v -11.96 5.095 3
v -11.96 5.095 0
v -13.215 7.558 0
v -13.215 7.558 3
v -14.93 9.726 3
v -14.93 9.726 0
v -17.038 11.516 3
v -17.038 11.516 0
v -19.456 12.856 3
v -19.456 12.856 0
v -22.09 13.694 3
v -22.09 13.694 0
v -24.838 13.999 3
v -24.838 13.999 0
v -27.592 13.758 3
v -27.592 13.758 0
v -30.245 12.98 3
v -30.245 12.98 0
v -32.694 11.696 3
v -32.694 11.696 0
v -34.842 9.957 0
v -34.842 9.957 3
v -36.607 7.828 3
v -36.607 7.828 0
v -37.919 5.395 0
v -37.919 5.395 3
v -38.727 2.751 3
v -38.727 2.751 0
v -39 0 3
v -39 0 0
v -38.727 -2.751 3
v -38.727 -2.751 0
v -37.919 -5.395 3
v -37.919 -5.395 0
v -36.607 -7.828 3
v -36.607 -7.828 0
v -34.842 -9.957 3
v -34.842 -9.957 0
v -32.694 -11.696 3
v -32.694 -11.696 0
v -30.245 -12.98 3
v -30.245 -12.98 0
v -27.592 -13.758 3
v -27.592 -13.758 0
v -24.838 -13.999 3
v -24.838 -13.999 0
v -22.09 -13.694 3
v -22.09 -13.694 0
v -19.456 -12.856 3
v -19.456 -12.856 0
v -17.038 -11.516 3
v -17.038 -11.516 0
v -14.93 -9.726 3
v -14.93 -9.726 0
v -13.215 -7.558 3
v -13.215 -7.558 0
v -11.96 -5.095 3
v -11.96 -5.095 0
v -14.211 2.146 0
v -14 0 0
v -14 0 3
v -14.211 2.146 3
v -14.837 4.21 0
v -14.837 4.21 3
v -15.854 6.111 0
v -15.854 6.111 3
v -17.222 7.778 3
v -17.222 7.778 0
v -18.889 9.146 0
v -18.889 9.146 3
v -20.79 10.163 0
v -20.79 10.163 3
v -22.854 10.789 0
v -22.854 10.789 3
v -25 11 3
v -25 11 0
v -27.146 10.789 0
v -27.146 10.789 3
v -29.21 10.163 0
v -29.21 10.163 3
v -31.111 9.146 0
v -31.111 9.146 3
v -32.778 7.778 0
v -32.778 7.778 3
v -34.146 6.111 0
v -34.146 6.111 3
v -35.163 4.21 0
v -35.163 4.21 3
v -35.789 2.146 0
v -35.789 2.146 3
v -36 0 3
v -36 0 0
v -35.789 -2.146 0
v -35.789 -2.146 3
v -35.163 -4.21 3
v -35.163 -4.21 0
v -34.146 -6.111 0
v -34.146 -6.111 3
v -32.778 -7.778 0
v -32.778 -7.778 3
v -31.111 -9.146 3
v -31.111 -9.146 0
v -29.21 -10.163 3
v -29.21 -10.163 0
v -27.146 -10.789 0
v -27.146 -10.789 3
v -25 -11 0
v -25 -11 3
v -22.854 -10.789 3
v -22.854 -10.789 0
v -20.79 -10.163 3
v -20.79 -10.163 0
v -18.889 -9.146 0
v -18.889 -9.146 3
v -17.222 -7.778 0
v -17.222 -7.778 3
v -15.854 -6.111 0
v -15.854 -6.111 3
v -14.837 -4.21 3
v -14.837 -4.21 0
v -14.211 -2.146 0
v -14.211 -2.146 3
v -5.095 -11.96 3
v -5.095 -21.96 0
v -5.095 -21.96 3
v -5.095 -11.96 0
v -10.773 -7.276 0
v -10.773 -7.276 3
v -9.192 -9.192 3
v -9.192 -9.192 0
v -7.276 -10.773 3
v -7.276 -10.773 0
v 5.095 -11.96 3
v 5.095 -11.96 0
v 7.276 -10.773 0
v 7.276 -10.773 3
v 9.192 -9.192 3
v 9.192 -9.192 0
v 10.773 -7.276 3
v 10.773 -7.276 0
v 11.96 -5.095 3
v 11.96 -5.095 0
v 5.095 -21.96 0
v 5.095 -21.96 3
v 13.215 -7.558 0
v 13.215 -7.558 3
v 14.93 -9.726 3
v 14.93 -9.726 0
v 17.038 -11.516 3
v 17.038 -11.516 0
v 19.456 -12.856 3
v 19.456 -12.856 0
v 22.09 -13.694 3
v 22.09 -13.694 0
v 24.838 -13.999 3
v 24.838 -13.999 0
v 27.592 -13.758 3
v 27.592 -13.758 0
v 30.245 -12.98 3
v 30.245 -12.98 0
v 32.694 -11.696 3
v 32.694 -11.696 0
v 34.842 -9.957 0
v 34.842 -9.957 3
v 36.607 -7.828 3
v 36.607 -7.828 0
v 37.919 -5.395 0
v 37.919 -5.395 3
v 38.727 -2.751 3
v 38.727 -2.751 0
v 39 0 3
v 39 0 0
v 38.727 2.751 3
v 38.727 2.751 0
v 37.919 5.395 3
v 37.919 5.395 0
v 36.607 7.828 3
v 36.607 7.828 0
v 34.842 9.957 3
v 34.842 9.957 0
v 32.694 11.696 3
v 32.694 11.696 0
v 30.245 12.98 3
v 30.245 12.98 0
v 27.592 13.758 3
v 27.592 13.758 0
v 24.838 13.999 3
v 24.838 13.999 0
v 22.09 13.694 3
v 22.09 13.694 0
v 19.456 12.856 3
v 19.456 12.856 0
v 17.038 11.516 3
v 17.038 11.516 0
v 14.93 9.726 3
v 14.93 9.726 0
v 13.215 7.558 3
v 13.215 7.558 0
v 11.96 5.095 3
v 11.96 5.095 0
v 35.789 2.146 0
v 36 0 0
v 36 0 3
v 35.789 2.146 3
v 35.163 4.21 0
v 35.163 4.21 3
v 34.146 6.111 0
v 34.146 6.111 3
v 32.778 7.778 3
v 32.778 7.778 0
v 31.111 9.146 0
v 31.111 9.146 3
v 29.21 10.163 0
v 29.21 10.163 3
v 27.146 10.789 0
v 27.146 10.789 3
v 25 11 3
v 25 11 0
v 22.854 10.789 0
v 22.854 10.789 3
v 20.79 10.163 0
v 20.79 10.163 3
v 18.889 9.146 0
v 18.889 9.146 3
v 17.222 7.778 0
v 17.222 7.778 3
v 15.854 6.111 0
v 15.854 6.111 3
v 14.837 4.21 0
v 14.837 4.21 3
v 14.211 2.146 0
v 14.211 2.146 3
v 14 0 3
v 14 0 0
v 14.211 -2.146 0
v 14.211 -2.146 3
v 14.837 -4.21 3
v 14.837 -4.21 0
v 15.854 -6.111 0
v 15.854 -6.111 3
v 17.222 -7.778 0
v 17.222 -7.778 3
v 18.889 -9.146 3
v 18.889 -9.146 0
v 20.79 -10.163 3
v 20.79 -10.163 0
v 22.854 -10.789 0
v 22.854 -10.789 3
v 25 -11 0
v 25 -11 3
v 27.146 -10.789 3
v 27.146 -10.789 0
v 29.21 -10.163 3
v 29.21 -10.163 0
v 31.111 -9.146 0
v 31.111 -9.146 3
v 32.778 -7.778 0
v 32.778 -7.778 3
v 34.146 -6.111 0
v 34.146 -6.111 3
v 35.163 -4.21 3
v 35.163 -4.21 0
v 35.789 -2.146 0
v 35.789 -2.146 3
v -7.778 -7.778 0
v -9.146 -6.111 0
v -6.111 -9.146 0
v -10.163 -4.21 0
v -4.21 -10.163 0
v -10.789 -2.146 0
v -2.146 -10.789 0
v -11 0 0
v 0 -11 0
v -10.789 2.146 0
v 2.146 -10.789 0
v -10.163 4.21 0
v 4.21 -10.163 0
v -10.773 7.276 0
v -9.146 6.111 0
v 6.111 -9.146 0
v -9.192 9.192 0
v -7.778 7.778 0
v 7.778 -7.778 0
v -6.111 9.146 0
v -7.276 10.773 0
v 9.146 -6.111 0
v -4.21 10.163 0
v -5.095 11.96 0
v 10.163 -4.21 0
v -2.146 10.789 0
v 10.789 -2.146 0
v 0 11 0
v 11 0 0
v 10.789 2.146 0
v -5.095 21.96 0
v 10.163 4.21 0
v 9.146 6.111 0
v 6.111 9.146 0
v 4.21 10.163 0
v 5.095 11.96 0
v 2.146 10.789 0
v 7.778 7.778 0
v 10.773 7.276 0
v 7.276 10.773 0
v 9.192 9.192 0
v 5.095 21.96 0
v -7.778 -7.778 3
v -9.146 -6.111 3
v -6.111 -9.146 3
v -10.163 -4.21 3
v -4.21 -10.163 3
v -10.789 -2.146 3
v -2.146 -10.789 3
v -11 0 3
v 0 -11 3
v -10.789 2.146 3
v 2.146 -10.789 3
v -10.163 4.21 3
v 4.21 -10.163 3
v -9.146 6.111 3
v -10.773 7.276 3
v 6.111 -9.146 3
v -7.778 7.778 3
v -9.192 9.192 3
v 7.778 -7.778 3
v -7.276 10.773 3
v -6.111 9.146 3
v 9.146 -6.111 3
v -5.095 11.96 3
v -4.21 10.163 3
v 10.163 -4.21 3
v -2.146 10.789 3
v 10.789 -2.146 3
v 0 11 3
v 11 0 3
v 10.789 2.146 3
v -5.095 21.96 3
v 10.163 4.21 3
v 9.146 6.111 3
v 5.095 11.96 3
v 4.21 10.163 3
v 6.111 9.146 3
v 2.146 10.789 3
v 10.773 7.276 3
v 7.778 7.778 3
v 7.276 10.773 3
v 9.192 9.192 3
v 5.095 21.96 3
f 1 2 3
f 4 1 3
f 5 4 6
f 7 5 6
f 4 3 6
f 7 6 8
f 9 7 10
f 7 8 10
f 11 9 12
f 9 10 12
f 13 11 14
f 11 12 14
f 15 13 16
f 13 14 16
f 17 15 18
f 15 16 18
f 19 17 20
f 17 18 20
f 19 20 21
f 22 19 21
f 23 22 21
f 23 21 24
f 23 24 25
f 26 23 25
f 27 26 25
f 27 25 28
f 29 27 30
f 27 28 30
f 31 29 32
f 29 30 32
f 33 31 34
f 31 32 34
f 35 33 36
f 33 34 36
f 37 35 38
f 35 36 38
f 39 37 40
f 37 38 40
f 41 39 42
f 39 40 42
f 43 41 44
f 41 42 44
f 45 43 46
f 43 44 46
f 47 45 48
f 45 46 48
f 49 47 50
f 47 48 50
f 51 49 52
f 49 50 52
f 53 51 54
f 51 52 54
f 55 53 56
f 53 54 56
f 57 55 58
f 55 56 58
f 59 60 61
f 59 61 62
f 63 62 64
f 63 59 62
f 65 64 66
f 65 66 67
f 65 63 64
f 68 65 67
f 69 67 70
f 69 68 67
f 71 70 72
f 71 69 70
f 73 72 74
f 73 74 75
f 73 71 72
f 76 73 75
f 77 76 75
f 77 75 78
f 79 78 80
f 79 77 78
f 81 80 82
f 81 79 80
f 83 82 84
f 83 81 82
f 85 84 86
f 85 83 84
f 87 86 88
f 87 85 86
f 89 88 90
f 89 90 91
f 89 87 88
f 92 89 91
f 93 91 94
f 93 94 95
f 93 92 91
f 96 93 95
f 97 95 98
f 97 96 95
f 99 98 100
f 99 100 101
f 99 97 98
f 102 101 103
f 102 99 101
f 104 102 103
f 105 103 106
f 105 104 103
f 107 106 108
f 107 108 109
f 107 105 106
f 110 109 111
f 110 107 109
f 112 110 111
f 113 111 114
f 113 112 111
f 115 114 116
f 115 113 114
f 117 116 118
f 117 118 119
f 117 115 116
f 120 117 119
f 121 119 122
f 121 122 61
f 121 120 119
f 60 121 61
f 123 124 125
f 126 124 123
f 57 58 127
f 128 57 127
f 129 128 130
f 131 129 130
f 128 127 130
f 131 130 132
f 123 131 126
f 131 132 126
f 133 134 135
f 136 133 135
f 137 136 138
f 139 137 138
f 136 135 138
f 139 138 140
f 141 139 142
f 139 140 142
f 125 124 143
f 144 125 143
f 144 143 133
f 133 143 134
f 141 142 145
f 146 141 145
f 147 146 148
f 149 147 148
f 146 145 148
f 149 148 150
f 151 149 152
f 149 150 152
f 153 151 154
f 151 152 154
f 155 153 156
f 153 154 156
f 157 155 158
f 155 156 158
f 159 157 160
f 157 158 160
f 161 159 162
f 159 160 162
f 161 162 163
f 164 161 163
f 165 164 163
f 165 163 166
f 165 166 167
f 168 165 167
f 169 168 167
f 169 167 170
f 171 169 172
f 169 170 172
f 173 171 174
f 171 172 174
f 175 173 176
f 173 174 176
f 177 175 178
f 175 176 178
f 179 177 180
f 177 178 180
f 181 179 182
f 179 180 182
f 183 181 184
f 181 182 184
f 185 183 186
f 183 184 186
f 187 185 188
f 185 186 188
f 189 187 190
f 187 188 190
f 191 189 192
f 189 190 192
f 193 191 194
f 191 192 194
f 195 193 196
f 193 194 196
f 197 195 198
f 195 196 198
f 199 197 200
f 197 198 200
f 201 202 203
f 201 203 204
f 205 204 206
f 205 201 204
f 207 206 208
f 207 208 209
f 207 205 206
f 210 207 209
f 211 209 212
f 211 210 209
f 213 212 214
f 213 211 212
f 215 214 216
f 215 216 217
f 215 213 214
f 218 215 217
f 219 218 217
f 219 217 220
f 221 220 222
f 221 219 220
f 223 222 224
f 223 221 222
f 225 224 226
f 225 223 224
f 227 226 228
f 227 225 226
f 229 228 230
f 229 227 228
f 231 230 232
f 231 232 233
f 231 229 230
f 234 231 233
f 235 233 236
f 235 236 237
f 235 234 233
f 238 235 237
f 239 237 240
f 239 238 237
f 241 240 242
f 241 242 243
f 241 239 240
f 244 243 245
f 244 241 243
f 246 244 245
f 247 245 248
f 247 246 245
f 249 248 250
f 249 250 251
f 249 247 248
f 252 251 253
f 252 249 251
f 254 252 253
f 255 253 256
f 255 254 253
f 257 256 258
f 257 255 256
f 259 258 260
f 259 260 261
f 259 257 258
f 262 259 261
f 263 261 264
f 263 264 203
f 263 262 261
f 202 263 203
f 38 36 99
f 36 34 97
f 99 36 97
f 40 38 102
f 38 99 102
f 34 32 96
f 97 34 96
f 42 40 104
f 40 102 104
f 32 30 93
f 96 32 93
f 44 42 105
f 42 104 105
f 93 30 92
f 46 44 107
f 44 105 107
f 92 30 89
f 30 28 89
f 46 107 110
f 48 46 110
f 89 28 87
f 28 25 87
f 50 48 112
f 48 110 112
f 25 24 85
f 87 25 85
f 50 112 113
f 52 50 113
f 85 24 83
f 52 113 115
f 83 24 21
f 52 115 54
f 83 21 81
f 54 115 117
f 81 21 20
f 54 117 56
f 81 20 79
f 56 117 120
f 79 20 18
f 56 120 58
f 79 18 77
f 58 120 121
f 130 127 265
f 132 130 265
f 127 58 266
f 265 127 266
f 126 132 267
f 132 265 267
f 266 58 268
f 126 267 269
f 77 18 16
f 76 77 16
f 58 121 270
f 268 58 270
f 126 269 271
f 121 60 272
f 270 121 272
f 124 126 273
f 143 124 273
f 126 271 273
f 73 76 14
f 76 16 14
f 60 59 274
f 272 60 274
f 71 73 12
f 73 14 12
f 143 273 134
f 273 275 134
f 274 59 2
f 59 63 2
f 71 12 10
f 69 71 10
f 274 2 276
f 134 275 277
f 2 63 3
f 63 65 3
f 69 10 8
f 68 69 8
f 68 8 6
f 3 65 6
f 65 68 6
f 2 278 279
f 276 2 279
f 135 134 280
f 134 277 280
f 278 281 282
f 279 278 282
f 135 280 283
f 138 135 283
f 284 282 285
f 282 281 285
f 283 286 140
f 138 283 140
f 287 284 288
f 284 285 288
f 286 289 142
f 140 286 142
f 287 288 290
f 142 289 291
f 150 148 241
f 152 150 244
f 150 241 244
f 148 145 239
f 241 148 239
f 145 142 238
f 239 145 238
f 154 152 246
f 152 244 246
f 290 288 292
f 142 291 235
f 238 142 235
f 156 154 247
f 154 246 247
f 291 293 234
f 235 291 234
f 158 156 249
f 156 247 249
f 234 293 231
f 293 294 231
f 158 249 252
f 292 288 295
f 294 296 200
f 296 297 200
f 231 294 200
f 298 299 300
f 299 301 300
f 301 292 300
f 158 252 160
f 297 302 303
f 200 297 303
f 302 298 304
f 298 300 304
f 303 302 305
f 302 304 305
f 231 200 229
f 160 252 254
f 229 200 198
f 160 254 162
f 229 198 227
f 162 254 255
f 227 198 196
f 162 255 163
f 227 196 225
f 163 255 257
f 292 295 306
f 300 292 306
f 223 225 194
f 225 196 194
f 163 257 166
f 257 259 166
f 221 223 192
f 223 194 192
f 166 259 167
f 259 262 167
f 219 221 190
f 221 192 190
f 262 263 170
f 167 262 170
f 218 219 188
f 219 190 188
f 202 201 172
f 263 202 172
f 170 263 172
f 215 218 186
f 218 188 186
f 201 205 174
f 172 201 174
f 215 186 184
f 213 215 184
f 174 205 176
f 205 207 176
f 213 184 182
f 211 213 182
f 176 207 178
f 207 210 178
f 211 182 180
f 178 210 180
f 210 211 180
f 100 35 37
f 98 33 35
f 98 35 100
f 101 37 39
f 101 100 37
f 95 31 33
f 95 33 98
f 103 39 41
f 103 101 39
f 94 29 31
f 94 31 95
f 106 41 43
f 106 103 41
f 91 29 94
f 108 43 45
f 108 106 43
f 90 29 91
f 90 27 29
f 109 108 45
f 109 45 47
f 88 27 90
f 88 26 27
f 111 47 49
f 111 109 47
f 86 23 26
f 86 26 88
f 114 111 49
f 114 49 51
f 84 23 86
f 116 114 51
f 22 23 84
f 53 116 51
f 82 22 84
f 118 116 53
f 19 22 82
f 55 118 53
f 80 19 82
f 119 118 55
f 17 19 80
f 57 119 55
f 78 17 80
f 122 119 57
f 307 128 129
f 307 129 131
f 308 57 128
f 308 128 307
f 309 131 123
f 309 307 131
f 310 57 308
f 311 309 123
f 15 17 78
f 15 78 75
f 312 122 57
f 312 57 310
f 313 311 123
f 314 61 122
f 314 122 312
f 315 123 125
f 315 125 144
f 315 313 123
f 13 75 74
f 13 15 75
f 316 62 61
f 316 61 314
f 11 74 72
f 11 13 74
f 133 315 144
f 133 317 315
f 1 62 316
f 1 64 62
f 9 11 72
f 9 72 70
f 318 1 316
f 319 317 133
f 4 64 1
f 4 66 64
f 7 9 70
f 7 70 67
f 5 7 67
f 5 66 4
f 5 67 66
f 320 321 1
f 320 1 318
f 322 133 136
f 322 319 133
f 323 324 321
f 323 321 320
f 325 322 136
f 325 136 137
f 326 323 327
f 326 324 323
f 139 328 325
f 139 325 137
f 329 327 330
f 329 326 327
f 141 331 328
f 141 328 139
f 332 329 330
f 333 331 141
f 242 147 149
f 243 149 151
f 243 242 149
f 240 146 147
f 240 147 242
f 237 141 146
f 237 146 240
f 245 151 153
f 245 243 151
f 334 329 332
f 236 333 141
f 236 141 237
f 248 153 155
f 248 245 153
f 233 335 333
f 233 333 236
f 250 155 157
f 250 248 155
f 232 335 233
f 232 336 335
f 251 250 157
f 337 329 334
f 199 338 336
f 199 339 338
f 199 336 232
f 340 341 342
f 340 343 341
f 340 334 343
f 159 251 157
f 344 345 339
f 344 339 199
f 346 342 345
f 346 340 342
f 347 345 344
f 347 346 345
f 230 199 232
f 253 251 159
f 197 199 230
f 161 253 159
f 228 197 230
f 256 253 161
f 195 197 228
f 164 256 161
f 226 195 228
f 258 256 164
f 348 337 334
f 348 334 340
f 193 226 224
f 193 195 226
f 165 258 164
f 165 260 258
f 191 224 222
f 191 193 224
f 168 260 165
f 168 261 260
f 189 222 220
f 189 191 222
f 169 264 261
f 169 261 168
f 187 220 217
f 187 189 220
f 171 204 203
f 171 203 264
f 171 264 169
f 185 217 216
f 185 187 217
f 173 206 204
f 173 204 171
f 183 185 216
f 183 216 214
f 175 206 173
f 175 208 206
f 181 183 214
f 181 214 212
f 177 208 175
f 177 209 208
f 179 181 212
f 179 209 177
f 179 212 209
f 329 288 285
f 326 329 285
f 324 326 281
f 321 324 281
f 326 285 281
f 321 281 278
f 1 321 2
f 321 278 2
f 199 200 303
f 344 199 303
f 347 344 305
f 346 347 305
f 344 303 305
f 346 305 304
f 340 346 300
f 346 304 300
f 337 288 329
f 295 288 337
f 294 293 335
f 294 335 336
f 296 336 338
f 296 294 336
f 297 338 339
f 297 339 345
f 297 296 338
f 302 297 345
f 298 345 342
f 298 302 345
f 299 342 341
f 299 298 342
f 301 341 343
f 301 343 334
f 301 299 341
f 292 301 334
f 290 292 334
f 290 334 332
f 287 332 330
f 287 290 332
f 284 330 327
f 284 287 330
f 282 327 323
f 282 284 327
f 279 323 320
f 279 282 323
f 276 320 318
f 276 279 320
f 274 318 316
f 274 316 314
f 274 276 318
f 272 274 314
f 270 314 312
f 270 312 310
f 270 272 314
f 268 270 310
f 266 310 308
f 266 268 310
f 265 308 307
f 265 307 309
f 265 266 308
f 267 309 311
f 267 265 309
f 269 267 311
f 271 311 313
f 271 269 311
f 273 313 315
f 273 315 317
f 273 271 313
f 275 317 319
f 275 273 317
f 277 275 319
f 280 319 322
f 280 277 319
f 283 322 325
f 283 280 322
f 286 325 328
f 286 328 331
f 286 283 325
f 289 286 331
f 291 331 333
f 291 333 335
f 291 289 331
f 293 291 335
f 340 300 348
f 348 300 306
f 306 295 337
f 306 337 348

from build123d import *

# Parameters (mm, degrees)
F0_R     = 11
F0_W     = 10.189878
F0_H     = 10
F1_DEPTH = 3


with BuildPart() as f1:
    # F0 (on Top) → F1 (new body)
    with BuildSketch(Plane.XY):
        with BuildLine():
            Line((5.094939, 11.96), (-5.094939, 11.96))
            ThreePointArc((-5.094939, 11.96), (-9.192388, 9.192388), (-11.96, 5.094939))
            ThreePointArc((-11.96, 5.094939), (-39, 0), (-11.96, -5.094939))
            ThreePointArc((-11.96, -5.094939), (-9.192388, -9.192388), (-5.094939, -11.96))
            Line((-5.094939, -11.96), (5.094939, -11.96))
            ThreePointArc((5.094939, -11.96), (9.192388, -9.192388), (11.96, -5.094939))
            ThreePointArc((11.96, -5.094939), (39, 0), (11.96, 5.094939))
            ThreePointArc((11.96, 5.094939), (9.192388, 9.192388), (5.094939, 11.96))
        make_face()
        with Locations((-25, 0)):
            Circle(F0_R, mode=Mode.SUBTRACT)
        Circle(F0_R, mode=Mode.SUBTRACT)
        with Locations((25, 0)):
            Circle(F0_R, mode=Mode.SUBTRACT)
        with Locations((0, 16.96)):
            Rectangle(F0_W, F0_H)
        with Locations((0, -16.96)):
            Rectangle(F0_W, F0_H)
    extrude(amount=F1_DEPTH)


solid = f1.part
